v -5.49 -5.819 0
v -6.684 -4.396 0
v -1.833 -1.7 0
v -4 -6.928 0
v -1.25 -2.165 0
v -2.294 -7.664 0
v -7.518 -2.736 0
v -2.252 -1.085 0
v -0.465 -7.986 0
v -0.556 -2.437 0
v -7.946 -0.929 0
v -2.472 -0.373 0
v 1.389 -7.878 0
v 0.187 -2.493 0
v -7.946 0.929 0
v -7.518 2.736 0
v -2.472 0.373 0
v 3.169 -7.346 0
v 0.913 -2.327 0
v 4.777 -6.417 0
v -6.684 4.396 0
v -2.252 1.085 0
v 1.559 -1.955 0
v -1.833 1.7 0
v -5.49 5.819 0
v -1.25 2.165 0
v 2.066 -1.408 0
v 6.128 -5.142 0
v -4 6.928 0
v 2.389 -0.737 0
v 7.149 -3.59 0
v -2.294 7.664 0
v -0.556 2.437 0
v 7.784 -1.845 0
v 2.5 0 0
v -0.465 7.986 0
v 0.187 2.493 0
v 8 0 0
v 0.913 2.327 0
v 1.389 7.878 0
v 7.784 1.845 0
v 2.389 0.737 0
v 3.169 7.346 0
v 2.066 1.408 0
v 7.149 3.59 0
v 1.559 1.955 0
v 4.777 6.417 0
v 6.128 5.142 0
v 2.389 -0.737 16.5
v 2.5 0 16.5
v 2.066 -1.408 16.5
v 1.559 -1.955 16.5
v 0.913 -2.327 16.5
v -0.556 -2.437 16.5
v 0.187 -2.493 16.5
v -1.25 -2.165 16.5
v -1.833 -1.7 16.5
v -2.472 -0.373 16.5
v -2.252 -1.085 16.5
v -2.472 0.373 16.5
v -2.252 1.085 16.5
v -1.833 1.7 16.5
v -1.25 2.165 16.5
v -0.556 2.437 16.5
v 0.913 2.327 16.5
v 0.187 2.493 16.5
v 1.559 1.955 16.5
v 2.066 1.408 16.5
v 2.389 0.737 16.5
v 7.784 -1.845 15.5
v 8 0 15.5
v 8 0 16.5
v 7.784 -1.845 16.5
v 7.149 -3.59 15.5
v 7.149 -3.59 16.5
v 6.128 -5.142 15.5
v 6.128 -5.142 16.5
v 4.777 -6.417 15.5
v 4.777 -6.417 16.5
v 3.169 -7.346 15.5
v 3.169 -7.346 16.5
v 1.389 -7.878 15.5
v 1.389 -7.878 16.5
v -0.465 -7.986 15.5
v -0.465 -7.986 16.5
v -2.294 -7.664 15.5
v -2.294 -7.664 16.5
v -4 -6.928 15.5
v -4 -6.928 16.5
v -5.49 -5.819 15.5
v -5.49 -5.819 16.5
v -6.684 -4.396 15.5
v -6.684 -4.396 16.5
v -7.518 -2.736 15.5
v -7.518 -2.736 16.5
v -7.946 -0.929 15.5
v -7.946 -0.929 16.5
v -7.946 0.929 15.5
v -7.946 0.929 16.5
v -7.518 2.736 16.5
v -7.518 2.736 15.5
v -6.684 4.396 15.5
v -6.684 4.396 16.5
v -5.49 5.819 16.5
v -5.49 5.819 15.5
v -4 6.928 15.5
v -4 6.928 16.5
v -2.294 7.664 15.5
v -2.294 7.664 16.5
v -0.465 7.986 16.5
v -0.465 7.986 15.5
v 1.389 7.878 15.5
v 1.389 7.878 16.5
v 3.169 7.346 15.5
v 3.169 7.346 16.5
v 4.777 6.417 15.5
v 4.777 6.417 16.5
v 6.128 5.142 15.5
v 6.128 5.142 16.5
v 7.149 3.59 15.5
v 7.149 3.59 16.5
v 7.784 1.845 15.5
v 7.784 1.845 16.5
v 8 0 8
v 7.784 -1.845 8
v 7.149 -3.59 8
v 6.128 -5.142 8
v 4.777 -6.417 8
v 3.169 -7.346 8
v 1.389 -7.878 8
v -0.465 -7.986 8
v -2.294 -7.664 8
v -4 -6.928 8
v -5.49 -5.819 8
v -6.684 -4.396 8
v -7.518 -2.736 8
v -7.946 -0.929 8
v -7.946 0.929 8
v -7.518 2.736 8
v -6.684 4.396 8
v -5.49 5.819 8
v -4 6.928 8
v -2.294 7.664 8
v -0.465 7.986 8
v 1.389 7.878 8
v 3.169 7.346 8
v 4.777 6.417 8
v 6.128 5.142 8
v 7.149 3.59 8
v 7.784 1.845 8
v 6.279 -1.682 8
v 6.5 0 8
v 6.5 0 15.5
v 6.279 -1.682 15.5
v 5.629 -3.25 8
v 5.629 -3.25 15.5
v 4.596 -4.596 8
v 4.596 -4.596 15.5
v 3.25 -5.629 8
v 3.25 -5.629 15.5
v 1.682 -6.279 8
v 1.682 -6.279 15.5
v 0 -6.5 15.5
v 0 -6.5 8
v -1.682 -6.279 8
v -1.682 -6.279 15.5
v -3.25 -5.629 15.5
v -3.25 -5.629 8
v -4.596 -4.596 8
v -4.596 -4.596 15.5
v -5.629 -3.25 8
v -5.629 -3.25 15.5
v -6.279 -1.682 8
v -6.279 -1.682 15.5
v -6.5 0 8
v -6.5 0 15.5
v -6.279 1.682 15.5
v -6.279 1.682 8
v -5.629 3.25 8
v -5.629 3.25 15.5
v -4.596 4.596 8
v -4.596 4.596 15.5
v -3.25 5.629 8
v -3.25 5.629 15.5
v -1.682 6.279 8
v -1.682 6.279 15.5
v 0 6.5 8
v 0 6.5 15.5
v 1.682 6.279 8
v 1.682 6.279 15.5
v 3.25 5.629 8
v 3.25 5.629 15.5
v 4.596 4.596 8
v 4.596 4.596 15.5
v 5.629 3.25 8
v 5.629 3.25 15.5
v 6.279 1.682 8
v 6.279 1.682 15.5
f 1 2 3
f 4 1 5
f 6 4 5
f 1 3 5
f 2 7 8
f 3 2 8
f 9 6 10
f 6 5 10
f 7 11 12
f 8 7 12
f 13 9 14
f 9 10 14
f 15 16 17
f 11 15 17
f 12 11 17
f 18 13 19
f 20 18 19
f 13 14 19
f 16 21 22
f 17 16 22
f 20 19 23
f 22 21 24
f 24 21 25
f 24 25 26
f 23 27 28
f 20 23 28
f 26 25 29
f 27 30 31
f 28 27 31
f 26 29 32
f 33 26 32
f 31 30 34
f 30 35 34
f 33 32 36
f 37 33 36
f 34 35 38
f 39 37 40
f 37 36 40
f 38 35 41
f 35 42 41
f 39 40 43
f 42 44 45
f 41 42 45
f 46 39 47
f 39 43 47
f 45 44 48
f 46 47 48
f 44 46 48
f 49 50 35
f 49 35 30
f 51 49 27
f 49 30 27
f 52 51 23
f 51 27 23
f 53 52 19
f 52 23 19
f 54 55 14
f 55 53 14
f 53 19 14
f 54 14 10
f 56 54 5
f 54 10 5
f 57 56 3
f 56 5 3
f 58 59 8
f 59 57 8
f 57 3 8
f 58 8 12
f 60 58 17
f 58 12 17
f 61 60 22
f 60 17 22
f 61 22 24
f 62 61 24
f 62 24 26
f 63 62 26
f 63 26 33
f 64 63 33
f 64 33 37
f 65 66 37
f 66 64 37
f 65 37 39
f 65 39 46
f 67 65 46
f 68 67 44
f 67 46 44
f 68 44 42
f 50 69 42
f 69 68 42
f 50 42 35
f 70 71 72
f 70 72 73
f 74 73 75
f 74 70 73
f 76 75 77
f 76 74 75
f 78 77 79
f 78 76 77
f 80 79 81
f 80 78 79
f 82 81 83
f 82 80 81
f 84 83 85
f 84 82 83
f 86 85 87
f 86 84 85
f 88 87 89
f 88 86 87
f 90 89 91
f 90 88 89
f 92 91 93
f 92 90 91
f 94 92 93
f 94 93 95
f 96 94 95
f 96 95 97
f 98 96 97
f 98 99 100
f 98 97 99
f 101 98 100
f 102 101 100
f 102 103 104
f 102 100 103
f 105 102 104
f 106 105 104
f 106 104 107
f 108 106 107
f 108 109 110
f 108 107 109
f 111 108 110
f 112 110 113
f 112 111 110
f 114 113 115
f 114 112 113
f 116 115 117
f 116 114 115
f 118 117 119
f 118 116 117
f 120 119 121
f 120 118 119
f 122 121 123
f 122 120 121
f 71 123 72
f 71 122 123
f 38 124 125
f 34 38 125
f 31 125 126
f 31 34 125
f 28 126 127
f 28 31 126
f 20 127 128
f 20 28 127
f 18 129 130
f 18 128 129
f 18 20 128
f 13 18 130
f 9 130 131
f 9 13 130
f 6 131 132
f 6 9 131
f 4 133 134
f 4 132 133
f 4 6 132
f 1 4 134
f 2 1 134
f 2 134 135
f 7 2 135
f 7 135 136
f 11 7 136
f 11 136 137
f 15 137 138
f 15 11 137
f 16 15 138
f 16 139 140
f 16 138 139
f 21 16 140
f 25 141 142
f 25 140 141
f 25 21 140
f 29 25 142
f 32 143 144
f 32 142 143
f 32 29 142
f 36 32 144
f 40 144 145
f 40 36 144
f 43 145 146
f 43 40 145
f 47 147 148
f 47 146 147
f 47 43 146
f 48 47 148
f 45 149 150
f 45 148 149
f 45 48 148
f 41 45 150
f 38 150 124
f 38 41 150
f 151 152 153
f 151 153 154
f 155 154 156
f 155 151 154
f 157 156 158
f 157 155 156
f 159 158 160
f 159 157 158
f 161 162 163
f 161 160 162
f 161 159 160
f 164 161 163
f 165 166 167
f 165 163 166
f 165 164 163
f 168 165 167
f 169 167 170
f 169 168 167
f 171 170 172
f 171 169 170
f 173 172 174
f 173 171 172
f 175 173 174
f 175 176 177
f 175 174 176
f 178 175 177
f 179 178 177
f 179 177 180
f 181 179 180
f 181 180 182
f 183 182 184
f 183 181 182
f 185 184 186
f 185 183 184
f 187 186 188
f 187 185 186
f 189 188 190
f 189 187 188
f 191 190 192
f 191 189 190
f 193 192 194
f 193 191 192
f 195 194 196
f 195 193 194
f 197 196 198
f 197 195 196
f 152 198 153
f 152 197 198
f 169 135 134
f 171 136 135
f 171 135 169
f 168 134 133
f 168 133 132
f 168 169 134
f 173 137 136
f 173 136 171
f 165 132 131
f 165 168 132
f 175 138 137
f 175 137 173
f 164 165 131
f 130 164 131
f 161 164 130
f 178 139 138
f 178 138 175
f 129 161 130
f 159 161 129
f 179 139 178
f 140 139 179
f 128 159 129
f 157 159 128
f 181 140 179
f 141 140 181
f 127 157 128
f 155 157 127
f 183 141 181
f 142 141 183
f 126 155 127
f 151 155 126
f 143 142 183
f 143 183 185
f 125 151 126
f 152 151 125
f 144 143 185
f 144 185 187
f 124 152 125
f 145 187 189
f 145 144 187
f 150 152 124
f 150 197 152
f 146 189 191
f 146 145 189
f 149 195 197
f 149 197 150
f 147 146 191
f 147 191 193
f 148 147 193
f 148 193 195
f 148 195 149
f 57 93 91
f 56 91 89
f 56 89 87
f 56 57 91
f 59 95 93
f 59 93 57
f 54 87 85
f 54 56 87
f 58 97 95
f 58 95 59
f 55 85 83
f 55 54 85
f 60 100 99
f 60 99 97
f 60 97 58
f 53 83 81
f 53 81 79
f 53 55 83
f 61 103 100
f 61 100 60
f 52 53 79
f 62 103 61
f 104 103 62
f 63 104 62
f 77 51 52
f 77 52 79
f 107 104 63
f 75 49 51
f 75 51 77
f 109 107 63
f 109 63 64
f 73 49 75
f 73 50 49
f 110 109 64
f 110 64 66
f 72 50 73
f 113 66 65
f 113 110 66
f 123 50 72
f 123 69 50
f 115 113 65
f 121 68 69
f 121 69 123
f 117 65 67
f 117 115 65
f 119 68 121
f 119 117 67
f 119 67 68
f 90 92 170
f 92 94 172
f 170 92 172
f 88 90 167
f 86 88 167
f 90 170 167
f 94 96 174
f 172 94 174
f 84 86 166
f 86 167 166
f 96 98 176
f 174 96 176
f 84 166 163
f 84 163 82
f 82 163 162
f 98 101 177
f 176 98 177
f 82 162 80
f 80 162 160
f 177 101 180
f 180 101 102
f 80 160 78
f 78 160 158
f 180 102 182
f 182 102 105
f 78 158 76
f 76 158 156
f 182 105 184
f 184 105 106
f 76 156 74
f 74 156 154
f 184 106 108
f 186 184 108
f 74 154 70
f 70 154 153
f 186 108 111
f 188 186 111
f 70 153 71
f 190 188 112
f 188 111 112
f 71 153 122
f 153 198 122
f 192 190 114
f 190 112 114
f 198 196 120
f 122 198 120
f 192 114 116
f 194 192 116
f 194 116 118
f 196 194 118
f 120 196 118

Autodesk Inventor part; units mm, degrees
ref_plane "YZ Plane" through (0, 0, 0) normal (1, 0, 0) x (0, 1, 0)
ref_plane "XZ Plane" through (0, 0, 0) normal (0, 1, 0) x (-1, 0, 0)
ref_plane "XY Plane" through (0, 0, 0) normal (0, 0, 1) x (1, 0, 0)
sketch "Szkic1" plane through (0, 0, 0) normal (0, 0, 1) x (1, 0, 0)
  circle A0 centre (0, 0) radius 2.5
  circle A1 centre (0, 0) radius 8
  dimension "d0" = 5
  dimension "d1" = 16
extrude "Wyciągnięcie proste1" add sketch "Szkic1" along normal blind 8
sketch "Szkic2" plane through (0, 0, 8) normal (0, 0, 1) x (1, 0, 0)
  circle A0 centre (0, 0) radius 2.5 projected
  circle A1 centre (0, 0) radius 8 projected
  circle A2 centre (0, 0) radius 6.5
  dimension "d4" = 13
extrude "Wyciągnięcie proste2" add sketch "Szkic2" along normal blind 7.5 contours A2
sketch "Szkic3" plane through (0, 0, 15.5) normal (0, 0, 1) x (1, 0, 0)
  circle A0 centre (0, 0) radius 6.5 projected
  circle A1 centre (0, 0) radius 8 projected
  circle A2 centre (0, 0) radius 2.5 projected
  circle A3 centre (0, 0) radius 6.5 projected
extrude "Wyciągnięcie proste3" add sketch "Szkic3" along normal blind 1 contours A0 | A1
properties part number "COTS_GENERIC_MXL_Pulley_X_Axis"
